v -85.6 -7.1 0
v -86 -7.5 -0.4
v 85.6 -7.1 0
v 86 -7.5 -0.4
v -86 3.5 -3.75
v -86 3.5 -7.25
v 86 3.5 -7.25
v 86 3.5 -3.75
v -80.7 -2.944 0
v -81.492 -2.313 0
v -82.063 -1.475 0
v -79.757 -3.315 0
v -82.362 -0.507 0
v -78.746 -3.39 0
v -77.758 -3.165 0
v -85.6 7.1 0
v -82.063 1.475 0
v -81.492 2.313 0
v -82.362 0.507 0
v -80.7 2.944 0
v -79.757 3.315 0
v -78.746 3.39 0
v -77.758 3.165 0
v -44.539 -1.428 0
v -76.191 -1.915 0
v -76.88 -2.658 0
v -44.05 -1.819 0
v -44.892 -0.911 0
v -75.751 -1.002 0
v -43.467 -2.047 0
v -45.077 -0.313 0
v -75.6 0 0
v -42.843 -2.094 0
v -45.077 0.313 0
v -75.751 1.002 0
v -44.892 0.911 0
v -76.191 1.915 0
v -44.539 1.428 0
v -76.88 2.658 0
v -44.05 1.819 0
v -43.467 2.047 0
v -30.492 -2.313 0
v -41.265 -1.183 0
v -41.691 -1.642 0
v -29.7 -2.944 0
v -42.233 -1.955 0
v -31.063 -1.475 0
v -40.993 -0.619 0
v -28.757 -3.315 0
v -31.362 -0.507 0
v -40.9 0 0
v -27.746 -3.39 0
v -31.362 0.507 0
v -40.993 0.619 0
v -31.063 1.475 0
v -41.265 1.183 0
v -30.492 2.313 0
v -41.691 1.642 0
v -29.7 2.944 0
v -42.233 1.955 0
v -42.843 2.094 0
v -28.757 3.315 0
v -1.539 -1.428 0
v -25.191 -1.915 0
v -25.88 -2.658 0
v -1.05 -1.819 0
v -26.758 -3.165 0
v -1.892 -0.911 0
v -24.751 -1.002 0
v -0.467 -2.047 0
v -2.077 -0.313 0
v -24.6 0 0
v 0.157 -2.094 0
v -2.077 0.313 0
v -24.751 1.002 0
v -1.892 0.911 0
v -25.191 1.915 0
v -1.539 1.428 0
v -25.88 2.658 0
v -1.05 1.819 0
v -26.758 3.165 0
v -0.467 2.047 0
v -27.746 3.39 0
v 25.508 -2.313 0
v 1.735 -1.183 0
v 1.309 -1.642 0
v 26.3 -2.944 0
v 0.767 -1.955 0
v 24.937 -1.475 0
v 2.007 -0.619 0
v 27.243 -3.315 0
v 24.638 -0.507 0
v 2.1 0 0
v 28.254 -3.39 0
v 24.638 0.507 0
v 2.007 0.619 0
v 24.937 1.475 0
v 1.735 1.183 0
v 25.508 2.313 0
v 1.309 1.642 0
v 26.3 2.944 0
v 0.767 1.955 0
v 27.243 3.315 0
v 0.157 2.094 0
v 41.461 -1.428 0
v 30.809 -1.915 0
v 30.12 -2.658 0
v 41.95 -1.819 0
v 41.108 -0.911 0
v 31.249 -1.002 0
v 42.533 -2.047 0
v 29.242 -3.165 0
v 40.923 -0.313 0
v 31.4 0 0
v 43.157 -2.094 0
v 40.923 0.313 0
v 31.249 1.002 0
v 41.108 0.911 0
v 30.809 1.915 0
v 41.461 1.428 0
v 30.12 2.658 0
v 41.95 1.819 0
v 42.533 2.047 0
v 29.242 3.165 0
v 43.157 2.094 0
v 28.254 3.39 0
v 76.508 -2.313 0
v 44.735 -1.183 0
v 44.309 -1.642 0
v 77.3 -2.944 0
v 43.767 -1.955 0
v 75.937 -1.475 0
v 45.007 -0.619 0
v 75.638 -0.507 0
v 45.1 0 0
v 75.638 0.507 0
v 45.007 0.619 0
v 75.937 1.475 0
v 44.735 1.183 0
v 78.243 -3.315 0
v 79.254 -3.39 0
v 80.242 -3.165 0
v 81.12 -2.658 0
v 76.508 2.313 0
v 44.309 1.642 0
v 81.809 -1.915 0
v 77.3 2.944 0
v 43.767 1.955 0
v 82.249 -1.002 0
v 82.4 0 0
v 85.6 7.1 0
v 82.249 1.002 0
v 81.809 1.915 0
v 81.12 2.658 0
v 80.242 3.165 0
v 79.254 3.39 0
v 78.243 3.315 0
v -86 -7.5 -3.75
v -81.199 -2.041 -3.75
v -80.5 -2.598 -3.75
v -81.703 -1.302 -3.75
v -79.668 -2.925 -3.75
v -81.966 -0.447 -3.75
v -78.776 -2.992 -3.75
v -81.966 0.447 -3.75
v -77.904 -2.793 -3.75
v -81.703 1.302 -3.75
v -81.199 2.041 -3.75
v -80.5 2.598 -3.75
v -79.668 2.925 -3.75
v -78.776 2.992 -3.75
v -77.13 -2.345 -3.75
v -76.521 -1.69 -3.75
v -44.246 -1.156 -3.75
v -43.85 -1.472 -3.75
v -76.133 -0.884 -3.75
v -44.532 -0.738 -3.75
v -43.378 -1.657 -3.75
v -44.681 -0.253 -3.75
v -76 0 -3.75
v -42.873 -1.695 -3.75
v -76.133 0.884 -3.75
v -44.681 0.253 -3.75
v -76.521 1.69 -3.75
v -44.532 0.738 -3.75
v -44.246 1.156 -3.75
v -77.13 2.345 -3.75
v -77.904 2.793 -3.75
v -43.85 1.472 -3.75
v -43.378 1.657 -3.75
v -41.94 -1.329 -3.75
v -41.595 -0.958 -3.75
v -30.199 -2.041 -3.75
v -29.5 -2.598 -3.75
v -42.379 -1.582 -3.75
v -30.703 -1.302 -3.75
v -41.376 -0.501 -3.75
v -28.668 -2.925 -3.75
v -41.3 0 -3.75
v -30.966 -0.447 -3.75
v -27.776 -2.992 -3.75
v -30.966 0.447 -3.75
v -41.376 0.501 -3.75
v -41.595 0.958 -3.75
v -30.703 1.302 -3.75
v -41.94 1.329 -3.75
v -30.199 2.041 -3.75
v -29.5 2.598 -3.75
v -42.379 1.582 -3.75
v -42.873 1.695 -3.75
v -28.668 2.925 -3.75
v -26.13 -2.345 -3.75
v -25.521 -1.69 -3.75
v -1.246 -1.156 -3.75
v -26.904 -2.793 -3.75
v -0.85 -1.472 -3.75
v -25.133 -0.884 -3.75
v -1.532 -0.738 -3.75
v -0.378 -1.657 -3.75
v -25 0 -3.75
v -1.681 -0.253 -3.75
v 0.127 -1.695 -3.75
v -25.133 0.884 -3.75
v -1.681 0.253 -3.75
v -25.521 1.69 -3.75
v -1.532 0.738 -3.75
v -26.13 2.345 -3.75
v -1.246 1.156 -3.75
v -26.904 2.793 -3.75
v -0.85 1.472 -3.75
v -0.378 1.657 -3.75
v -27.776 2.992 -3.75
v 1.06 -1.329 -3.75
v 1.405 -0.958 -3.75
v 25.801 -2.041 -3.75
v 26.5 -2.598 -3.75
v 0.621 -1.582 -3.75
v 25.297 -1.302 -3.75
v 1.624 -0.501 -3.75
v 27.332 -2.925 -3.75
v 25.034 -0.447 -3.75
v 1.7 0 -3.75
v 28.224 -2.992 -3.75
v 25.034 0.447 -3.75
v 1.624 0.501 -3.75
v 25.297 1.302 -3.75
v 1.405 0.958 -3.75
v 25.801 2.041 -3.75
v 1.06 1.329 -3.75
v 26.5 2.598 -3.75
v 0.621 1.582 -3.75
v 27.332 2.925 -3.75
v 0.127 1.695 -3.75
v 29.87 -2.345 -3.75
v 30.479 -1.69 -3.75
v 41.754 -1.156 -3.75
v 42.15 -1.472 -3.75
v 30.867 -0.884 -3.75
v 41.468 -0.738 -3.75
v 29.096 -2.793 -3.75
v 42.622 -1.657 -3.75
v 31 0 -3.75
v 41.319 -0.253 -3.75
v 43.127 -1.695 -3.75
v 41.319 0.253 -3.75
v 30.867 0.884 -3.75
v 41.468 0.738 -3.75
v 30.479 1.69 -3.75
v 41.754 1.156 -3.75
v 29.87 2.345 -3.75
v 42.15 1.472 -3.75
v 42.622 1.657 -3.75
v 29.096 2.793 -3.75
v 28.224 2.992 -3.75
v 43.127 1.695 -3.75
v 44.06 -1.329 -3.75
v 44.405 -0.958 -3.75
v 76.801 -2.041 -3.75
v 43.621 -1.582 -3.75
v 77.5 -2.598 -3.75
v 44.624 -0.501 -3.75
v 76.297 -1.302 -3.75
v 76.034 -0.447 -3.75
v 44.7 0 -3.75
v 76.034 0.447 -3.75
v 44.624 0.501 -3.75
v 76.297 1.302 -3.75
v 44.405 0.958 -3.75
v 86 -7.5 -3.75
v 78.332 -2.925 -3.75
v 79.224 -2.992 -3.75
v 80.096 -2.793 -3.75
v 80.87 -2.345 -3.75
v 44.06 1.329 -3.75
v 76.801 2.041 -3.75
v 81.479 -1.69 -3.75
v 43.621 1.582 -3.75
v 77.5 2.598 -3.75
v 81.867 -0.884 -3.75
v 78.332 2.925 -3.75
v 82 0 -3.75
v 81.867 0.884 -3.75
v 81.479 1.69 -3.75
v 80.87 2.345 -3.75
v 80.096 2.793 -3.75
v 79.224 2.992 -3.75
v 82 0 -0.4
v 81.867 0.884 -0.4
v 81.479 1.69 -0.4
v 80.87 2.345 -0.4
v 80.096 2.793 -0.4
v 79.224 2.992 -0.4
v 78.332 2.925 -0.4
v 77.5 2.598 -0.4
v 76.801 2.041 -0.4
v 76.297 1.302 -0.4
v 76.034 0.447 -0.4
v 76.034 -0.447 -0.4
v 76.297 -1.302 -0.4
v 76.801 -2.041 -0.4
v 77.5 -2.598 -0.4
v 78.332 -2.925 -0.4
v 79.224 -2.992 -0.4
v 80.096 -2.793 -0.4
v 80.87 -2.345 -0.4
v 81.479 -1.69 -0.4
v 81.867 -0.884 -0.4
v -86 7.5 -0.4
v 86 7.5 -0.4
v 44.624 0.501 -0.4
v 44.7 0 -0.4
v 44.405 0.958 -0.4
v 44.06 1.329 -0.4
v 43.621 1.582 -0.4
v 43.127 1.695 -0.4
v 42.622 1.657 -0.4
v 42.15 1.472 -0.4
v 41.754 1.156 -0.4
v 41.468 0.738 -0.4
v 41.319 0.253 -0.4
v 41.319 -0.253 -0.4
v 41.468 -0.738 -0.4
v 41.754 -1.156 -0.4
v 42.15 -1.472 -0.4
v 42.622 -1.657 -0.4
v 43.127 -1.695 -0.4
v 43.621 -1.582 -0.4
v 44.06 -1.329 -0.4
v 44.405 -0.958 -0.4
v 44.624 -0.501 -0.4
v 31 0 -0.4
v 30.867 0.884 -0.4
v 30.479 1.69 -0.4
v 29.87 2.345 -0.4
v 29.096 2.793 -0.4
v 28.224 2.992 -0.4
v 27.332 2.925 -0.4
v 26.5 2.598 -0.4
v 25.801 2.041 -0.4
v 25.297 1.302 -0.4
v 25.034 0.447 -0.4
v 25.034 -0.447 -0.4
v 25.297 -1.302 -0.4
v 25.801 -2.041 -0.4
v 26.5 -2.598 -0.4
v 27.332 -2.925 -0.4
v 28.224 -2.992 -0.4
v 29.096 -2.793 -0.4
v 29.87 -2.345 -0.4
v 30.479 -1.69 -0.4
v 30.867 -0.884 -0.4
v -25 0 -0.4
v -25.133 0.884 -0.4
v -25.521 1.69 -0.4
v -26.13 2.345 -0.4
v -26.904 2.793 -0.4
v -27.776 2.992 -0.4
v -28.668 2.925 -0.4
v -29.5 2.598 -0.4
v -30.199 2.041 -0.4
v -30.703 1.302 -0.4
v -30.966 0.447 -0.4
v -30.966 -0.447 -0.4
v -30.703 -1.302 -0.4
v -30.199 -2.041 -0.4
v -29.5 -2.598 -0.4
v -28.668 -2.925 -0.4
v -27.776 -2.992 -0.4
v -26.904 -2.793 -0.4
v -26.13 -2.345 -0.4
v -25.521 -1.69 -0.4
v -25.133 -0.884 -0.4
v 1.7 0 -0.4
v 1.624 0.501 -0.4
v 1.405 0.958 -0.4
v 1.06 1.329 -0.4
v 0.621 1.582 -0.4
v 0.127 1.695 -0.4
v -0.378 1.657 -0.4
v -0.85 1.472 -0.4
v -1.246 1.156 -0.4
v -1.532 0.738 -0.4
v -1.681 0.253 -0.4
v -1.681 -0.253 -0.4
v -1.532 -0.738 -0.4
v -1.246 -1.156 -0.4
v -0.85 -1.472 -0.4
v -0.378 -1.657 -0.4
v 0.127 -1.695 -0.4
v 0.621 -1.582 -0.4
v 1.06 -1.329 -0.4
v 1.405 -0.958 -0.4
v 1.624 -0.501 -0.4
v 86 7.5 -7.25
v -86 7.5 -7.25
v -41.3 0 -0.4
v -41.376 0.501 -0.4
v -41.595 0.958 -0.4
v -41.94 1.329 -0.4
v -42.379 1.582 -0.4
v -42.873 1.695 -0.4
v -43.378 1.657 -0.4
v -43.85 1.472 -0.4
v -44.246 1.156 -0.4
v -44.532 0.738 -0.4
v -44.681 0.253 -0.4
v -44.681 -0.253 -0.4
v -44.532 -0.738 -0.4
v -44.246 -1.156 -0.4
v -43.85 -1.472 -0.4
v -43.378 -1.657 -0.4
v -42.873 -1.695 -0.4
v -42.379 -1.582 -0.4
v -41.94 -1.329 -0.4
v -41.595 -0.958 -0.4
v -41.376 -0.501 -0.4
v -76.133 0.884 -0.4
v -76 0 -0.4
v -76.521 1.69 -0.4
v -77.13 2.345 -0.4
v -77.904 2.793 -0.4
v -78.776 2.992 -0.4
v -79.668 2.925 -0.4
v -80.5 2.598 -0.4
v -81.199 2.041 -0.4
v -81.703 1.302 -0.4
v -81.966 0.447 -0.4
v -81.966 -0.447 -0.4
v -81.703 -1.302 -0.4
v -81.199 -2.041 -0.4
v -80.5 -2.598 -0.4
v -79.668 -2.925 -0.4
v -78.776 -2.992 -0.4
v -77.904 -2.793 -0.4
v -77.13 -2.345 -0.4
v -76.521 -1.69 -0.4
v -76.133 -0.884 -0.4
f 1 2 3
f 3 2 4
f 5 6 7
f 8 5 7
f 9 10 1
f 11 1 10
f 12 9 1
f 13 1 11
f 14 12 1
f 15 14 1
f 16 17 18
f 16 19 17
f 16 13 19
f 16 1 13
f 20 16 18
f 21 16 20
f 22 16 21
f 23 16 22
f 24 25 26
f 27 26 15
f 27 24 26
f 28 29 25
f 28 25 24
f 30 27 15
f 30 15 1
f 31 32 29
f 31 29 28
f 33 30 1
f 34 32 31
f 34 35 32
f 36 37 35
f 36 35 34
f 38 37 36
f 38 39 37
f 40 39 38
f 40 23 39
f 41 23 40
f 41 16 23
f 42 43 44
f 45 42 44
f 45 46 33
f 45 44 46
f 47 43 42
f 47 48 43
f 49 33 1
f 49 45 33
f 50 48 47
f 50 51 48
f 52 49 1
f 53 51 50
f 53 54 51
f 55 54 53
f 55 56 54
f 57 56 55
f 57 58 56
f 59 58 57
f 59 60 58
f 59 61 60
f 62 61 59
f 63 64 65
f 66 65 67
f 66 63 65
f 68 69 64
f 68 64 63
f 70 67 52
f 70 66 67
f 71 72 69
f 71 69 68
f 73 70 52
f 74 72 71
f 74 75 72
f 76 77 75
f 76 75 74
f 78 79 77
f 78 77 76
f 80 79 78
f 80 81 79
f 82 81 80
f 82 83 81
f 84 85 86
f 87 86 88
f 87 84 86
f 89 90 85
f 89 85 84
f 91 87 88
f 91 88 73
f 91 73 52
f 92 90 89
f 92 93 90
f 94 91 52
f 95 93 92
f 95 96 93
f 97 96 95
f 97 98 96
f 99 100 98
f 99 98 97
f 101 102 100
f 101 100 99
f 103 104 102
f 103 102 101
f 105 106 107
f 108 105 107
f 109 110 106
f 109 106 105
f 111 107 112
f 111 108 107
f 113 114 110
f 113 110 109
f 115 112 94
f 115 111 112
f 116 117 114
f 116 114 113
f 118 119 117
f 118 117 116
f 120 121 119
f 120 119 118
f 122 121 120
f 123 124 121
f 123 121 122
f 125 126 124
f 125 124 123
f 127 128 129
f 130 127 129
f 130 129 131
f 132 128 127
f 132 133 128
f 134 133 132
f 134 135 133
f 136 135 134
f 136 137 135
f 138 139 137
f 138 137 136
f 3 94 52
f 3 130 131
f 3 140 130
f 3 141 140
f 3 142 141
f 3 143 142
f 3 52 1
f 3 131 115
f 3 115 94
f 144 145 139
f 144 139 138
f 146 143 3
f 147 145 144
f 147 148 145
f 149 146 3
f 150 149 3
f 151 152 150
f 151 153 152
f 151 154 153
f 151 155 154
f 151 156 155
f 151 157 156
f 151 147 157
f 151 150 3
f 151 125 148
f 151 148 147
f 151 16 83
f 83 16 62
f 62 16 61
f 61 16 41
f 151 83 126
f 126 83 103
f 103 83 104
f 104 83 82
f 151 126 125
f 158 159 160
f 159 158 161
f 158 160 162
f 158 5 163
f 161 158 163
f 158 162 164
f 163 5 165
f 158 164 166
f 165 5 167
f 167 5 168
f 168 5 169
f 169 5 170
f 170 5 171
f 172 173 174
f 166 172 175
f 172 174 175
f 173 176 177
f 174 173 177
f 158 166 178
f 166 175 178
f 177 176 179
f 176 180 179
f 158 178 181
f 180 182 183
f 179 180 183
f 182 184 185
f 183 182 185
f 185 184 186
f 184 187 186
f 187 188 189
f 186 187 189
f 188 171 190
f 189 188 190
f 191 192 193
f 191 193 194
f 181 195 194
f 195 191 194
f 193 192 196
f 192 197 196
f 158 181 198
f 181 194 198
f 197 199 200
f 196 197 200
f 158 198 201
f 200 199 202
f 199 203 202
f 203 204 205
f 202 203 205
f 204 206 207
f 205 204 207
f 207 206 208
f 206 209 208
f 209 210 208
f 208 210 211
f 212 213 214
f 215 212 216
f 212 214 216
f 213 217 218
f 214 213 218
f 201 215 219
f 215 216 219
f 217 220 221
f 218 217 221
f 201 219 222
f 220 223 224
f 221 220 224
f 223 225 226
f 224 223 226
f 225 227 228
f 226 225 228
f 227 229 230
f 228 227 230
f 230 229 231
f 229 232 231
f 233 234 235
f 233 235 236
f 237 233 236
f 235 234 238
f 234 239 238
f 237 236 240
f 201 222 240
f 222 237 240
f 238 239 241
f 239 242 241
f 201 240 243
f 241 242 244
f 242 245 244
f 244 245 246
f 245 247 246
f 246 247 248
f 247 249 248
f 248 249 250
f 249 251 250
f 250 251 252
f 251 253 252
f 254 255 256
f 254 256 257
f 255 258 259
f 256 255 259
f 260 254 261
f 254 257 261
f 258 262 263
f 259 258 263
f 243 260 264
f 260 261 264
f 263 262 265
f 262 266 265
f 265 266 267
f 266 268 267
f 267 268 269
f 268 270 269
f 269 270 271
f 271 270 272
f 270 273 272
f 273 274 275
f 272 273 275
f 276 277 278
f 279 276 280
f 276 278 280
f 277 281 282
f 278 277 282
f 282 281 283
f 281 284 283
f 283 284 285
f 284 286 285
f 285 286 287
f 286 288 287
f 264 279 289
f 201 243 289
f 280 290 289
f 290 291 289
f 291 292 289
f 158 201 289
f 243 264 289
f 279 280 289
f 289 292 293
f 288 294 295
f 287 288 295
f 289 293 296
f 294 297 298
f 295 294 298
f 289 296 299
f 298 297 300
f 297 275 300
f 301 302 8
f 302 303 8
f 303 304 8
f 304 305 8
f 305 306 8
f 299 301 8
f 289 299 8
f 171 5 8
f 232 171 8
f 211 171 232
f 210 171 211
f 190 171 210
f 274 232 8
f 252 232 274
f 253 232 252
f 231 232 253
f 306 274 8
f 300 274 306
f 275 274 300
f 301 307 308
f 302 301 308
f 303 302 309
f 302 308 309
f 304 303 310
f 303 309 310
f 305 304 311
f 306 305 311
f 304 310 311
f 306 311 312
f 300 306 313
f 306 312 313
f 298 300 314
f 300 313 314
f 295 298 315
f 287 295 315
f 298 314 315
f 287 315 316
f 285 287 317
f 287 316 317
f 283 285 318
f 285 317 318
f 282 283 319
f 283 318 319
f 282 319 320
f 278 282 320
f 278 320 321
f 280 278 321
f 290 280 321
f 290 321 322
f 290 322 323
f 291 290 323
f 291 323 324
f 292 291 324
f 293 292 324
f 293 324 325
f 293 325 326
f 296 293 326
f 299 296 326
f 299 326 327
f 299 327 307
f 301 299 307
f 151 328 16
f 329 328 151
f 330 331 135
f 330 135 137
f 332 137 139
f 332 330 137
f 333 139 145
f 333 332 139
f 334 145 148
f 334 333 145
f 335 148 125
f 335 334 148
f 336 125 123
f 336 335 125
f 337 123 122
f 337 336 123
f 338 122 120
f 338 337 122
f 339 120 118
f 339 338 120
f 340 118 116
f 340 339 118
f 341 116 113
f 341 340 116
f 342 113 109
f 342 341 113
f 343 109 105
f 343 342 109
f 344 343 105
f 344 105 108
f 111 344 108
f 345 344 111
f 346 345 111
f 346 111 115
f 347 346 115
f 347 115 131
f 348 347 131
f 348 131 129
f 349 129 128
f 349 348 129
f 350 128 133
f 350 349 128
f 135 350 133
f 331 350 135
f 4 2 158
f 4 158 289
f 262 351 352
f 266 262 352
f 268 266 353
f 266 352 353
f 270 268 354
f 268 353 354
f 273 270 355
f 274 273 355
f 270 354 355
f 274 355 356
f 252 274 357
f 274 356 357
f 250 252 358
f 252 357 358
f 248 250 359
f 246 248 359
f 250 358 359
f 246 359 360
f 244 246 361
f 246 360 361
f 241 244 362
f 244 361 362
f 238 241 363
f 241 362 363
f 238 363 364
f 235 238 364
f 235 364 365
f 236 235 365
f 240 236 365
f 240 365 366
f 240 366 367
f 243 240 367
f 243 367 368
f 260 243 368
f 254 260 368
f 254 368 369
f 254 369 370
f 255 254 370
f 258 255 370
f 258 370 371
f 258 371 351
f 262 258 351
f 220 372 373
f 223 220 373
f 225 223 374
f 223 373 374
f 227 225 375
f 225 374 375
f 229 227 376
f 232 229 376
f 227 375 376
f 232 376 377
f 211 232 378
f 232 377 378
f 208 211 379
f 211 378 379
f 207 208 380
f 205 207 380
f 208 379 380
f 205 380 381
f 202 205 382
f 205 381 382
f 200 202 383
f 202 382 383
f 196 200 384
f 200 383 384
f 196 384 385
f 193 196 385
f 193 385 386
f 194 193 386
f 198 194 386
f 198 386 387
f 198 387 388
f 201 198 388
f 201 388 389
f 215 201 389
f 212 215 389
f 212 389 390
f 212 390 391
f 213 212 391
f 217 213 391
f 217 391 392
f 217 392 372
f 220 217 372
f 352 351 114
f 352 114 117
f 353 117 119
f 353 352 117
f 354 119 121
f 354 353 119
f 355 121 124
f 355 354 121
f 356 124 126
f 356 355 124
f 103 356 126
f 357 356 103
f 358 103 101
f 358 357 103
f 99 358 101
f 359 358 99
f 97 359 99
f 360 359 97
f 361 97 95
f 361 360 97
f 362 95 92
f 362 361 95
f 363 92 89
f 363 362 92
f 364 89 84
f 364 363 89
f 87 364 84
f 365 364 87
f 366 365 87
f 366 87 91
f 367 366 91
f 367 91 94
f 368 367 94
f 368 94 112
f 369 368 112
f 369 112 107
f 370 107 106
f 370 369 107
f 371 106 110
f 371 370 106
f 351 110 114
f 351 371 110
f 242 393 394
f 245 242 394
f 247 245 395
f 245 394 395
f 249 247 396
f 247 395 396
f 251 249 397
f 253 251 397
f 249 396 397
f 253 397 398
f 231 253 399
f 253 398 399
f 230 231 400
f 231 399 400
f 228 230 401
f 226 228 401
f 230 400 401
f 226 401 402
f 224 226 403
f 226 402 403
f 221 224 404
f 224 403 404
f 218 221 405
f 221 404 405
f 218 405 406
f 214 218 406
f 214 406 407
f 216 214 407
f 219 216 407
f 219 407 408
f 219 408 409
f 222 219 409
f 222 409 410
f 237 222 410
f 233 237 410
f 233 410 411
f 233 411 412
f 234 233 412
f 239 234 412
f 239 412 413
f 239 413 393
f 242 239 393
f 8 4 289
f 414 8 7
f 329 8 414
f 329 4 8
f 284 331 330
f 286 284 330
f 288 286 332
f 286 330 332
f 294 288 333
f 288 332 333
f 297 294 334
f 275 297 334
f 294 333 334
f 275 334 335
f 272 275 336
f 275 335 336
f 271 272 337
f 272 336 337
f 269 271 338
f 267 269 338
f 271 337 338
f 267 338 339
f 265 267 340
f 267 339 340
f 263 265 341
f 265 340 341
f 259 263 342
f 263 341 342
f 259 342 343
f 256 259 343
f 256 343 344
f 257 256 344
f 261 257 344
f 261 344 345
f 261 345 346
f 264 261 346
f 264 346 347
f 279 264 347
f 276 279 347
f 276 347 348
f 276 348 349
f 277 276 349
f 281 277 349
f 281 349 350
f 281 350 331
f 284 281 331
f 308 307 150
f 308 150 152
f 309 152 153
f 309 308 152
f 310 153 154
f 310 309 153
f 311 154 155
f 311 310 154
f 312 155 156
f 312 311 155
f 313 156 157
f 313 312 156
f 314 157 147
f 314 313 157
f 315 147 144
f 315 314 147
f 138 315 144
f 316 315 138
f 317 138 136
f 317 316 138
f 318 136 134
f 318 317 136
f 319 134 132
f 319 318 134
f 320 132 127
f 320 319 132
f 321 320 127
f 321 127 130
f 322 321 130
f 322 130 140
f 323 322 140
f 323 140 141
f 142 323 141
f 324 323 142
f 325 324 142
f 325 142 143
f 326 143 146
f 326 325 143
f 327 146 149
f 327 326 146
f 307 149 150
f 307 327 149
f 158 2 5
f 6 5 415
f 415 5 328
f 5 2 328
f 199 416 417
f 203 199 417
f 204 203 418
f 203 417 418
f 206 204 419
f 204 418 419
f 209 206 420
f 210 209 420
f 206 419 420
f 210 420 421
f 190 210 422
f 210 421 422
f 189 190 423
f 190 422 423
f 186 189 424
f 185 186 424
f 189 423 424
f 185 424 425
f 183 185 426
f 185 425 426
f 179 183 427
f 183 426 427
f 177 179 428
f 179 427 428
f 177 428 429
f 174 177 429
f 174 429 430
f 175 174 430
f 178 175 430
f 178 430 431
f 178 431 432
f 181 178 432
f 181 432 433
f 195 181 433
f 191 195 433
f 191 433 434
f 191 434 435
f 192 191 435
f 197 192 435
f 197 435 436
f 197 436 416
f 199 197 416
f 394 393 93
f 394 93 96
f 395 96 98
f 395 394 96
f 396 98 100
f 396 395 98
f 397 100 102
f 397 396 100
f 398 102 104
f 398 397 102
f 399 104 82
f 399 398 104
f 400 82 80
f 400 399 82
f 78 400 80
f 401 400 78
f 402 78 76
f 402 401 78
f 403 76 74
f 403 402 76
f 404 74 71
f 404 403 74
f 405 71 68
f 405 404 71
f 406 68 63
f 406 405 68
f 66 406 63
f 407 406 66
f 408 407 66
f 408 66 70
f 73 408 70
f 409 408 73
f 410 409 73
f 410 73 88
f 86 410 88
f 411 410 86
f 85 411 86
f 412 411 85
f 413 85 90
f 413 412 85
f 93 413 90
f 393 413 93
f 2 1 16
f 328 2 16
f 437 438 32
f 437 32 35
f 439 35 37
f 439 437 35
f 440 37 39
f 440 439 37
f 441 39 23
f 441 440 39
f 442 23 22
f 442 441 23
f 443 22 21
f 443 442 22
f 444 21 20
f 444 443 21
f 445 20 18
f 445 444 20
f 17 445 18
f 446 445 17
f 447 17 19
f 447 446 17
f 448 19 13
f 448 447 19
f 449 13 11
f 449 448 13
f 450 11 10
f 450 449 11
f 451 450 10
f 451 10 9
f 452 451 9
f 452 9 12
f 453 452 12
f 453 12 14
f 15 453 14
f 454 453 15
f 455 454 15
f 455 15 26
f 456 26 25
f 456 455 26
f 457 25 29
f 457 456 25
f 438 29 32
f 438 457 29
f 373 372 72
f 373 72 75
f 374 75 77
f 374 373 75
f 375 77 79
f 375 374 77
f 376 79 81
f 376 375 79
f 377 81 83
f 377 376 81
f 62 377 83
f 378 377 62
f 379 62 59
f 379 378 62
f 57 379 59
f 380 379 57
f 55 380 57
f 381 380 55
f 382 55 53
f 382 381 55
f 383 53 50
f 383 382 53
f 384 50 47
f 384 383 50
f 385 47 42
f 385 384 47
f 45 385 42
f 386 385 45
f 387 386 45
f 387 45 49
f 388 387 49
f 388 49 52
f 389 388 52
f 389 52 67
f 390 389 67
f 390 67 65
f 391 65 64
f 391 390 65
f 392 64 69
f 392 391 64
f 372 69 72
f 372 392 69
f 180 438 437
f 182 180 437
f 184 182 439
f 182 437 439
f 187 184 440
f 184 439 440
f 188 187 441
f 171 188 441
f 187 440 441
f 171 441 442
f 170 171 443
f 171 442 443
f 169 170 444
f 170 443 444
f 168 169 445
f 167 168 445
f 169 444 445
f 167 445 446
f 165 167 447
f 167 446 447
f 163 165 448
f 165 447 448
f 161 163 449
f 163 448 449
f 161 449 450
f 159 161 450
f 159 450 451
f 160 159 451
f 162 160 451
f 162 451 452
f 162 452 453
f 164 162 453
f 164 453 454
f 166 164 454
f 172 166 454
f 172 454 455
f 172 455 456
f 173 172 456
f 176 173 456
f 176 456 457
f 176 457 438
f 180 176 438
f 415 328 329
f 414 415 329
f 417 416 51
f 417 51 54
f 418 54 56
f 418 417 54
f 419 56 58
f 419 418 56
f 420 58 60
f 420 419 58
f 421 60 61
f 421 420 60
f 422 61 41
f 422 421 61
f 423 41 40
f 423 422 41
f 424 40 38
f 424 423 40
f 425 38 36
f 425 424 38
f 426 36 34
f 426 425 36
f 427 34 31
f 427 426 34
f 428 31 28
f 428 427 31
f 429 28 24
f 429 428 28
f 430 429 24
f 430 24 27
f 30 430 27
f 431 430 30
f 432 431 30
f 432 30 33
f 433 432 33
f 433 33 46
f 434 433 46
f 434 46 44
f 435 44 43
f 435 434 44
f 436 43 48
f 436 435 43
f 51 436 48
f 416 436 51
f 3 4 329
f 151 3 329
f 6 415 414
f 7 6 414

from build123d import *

# Parameters (mm, degrees)
SKETCH1_W               = 172
SKETCH1_H               = 15
BOSS_EXTRUDE1_DEPTH     = 7.25
CUT_EXTRUDE1_START      = -7.25
SKETCH1_6_W             = 172
SKETCH1_6_H             = 11
CUT_EXTRUDE1_DEPTH      = 3.5
SKETCH2_R               = 1.7
SKETCH2_R_2             = 3
CUT_EXTRUDE2_DEPTH      = 1
CUT_EXTRUDE2_DEPTH_BACK = 8.25
CHAMFER1_SIZE           = 0.4


with BuildPart() as part:
    # Sketch1 → Boss-Extrude1 (new body)
    with BuildSketch(Plane.XY):
        Rectangle(SKETCH1_W, SKETCH1_H)
    extrude(amount=-BOSS_EXTRUDE1_DEPTH)

    # Sketch1<6> → Cut-Extrude1 (cut)
    with BuildSketch(Plane.XY.offset(CUT_EXTRUDE1_START)):
        with Locations((0, -2)):
            Rectangle(SKETCH1_6_W, SKETCH1_6_H)
    extrude(amount=CUT_EXTRUDE1_DEPTH, mode=Mode.SUBTRACT)

    # Sketch2 → Cut-Extrude2 (cut, two sides)
    with BuildSketch(Plane.XY) as cut_extrude2_sk:
        with Locations((-43, 0)):
            Circle(SKETCH2_R)
        Circle(SKETCH2_R)
        with Locations((43, 0)):
            Circle(SKETCH2_R)
        with Locations((-79, 0)):
            Circle(SKETCH2_R_2)
        with Locations((79, 0)):
            Circle(SKETCH2_R_2)
        with Locations((-28, 0)):
            Circle(SKETCH2_R_2)
        with Locations((28, 0)):
            Circle(SKETCH2_R_2)
    extrude(amount=CUT_EXTRUDE2_DEPTH, mode=Mode.SUBTRACT)
    extrude(cut_extrude2_sk.sketch, amount=-CUT_EXTRUDE2_DEPTH_BACK, mode=Mode.SUBTRACT)

    # Chamfer1
    chamfer1_edges = [part.edges().sort_by_distance(p)[0] for p in [
        (76, 0, 0),
        (-82, 0, 0),
        (41.3, 0, 0),
        (-44.7, 0, 0),
        (-31, 0, 0),
        (25, 0, 0),
        (-1.7, 0, 0),
        (0, -7.5, 0),
        (-86, 0, 0),
        (0, 7.5, 0),
        (86, 0, 0),
    ]]
    chamfer(chamfer1_edges, length=CHAMFER1_SIZE)


solid = part.part
